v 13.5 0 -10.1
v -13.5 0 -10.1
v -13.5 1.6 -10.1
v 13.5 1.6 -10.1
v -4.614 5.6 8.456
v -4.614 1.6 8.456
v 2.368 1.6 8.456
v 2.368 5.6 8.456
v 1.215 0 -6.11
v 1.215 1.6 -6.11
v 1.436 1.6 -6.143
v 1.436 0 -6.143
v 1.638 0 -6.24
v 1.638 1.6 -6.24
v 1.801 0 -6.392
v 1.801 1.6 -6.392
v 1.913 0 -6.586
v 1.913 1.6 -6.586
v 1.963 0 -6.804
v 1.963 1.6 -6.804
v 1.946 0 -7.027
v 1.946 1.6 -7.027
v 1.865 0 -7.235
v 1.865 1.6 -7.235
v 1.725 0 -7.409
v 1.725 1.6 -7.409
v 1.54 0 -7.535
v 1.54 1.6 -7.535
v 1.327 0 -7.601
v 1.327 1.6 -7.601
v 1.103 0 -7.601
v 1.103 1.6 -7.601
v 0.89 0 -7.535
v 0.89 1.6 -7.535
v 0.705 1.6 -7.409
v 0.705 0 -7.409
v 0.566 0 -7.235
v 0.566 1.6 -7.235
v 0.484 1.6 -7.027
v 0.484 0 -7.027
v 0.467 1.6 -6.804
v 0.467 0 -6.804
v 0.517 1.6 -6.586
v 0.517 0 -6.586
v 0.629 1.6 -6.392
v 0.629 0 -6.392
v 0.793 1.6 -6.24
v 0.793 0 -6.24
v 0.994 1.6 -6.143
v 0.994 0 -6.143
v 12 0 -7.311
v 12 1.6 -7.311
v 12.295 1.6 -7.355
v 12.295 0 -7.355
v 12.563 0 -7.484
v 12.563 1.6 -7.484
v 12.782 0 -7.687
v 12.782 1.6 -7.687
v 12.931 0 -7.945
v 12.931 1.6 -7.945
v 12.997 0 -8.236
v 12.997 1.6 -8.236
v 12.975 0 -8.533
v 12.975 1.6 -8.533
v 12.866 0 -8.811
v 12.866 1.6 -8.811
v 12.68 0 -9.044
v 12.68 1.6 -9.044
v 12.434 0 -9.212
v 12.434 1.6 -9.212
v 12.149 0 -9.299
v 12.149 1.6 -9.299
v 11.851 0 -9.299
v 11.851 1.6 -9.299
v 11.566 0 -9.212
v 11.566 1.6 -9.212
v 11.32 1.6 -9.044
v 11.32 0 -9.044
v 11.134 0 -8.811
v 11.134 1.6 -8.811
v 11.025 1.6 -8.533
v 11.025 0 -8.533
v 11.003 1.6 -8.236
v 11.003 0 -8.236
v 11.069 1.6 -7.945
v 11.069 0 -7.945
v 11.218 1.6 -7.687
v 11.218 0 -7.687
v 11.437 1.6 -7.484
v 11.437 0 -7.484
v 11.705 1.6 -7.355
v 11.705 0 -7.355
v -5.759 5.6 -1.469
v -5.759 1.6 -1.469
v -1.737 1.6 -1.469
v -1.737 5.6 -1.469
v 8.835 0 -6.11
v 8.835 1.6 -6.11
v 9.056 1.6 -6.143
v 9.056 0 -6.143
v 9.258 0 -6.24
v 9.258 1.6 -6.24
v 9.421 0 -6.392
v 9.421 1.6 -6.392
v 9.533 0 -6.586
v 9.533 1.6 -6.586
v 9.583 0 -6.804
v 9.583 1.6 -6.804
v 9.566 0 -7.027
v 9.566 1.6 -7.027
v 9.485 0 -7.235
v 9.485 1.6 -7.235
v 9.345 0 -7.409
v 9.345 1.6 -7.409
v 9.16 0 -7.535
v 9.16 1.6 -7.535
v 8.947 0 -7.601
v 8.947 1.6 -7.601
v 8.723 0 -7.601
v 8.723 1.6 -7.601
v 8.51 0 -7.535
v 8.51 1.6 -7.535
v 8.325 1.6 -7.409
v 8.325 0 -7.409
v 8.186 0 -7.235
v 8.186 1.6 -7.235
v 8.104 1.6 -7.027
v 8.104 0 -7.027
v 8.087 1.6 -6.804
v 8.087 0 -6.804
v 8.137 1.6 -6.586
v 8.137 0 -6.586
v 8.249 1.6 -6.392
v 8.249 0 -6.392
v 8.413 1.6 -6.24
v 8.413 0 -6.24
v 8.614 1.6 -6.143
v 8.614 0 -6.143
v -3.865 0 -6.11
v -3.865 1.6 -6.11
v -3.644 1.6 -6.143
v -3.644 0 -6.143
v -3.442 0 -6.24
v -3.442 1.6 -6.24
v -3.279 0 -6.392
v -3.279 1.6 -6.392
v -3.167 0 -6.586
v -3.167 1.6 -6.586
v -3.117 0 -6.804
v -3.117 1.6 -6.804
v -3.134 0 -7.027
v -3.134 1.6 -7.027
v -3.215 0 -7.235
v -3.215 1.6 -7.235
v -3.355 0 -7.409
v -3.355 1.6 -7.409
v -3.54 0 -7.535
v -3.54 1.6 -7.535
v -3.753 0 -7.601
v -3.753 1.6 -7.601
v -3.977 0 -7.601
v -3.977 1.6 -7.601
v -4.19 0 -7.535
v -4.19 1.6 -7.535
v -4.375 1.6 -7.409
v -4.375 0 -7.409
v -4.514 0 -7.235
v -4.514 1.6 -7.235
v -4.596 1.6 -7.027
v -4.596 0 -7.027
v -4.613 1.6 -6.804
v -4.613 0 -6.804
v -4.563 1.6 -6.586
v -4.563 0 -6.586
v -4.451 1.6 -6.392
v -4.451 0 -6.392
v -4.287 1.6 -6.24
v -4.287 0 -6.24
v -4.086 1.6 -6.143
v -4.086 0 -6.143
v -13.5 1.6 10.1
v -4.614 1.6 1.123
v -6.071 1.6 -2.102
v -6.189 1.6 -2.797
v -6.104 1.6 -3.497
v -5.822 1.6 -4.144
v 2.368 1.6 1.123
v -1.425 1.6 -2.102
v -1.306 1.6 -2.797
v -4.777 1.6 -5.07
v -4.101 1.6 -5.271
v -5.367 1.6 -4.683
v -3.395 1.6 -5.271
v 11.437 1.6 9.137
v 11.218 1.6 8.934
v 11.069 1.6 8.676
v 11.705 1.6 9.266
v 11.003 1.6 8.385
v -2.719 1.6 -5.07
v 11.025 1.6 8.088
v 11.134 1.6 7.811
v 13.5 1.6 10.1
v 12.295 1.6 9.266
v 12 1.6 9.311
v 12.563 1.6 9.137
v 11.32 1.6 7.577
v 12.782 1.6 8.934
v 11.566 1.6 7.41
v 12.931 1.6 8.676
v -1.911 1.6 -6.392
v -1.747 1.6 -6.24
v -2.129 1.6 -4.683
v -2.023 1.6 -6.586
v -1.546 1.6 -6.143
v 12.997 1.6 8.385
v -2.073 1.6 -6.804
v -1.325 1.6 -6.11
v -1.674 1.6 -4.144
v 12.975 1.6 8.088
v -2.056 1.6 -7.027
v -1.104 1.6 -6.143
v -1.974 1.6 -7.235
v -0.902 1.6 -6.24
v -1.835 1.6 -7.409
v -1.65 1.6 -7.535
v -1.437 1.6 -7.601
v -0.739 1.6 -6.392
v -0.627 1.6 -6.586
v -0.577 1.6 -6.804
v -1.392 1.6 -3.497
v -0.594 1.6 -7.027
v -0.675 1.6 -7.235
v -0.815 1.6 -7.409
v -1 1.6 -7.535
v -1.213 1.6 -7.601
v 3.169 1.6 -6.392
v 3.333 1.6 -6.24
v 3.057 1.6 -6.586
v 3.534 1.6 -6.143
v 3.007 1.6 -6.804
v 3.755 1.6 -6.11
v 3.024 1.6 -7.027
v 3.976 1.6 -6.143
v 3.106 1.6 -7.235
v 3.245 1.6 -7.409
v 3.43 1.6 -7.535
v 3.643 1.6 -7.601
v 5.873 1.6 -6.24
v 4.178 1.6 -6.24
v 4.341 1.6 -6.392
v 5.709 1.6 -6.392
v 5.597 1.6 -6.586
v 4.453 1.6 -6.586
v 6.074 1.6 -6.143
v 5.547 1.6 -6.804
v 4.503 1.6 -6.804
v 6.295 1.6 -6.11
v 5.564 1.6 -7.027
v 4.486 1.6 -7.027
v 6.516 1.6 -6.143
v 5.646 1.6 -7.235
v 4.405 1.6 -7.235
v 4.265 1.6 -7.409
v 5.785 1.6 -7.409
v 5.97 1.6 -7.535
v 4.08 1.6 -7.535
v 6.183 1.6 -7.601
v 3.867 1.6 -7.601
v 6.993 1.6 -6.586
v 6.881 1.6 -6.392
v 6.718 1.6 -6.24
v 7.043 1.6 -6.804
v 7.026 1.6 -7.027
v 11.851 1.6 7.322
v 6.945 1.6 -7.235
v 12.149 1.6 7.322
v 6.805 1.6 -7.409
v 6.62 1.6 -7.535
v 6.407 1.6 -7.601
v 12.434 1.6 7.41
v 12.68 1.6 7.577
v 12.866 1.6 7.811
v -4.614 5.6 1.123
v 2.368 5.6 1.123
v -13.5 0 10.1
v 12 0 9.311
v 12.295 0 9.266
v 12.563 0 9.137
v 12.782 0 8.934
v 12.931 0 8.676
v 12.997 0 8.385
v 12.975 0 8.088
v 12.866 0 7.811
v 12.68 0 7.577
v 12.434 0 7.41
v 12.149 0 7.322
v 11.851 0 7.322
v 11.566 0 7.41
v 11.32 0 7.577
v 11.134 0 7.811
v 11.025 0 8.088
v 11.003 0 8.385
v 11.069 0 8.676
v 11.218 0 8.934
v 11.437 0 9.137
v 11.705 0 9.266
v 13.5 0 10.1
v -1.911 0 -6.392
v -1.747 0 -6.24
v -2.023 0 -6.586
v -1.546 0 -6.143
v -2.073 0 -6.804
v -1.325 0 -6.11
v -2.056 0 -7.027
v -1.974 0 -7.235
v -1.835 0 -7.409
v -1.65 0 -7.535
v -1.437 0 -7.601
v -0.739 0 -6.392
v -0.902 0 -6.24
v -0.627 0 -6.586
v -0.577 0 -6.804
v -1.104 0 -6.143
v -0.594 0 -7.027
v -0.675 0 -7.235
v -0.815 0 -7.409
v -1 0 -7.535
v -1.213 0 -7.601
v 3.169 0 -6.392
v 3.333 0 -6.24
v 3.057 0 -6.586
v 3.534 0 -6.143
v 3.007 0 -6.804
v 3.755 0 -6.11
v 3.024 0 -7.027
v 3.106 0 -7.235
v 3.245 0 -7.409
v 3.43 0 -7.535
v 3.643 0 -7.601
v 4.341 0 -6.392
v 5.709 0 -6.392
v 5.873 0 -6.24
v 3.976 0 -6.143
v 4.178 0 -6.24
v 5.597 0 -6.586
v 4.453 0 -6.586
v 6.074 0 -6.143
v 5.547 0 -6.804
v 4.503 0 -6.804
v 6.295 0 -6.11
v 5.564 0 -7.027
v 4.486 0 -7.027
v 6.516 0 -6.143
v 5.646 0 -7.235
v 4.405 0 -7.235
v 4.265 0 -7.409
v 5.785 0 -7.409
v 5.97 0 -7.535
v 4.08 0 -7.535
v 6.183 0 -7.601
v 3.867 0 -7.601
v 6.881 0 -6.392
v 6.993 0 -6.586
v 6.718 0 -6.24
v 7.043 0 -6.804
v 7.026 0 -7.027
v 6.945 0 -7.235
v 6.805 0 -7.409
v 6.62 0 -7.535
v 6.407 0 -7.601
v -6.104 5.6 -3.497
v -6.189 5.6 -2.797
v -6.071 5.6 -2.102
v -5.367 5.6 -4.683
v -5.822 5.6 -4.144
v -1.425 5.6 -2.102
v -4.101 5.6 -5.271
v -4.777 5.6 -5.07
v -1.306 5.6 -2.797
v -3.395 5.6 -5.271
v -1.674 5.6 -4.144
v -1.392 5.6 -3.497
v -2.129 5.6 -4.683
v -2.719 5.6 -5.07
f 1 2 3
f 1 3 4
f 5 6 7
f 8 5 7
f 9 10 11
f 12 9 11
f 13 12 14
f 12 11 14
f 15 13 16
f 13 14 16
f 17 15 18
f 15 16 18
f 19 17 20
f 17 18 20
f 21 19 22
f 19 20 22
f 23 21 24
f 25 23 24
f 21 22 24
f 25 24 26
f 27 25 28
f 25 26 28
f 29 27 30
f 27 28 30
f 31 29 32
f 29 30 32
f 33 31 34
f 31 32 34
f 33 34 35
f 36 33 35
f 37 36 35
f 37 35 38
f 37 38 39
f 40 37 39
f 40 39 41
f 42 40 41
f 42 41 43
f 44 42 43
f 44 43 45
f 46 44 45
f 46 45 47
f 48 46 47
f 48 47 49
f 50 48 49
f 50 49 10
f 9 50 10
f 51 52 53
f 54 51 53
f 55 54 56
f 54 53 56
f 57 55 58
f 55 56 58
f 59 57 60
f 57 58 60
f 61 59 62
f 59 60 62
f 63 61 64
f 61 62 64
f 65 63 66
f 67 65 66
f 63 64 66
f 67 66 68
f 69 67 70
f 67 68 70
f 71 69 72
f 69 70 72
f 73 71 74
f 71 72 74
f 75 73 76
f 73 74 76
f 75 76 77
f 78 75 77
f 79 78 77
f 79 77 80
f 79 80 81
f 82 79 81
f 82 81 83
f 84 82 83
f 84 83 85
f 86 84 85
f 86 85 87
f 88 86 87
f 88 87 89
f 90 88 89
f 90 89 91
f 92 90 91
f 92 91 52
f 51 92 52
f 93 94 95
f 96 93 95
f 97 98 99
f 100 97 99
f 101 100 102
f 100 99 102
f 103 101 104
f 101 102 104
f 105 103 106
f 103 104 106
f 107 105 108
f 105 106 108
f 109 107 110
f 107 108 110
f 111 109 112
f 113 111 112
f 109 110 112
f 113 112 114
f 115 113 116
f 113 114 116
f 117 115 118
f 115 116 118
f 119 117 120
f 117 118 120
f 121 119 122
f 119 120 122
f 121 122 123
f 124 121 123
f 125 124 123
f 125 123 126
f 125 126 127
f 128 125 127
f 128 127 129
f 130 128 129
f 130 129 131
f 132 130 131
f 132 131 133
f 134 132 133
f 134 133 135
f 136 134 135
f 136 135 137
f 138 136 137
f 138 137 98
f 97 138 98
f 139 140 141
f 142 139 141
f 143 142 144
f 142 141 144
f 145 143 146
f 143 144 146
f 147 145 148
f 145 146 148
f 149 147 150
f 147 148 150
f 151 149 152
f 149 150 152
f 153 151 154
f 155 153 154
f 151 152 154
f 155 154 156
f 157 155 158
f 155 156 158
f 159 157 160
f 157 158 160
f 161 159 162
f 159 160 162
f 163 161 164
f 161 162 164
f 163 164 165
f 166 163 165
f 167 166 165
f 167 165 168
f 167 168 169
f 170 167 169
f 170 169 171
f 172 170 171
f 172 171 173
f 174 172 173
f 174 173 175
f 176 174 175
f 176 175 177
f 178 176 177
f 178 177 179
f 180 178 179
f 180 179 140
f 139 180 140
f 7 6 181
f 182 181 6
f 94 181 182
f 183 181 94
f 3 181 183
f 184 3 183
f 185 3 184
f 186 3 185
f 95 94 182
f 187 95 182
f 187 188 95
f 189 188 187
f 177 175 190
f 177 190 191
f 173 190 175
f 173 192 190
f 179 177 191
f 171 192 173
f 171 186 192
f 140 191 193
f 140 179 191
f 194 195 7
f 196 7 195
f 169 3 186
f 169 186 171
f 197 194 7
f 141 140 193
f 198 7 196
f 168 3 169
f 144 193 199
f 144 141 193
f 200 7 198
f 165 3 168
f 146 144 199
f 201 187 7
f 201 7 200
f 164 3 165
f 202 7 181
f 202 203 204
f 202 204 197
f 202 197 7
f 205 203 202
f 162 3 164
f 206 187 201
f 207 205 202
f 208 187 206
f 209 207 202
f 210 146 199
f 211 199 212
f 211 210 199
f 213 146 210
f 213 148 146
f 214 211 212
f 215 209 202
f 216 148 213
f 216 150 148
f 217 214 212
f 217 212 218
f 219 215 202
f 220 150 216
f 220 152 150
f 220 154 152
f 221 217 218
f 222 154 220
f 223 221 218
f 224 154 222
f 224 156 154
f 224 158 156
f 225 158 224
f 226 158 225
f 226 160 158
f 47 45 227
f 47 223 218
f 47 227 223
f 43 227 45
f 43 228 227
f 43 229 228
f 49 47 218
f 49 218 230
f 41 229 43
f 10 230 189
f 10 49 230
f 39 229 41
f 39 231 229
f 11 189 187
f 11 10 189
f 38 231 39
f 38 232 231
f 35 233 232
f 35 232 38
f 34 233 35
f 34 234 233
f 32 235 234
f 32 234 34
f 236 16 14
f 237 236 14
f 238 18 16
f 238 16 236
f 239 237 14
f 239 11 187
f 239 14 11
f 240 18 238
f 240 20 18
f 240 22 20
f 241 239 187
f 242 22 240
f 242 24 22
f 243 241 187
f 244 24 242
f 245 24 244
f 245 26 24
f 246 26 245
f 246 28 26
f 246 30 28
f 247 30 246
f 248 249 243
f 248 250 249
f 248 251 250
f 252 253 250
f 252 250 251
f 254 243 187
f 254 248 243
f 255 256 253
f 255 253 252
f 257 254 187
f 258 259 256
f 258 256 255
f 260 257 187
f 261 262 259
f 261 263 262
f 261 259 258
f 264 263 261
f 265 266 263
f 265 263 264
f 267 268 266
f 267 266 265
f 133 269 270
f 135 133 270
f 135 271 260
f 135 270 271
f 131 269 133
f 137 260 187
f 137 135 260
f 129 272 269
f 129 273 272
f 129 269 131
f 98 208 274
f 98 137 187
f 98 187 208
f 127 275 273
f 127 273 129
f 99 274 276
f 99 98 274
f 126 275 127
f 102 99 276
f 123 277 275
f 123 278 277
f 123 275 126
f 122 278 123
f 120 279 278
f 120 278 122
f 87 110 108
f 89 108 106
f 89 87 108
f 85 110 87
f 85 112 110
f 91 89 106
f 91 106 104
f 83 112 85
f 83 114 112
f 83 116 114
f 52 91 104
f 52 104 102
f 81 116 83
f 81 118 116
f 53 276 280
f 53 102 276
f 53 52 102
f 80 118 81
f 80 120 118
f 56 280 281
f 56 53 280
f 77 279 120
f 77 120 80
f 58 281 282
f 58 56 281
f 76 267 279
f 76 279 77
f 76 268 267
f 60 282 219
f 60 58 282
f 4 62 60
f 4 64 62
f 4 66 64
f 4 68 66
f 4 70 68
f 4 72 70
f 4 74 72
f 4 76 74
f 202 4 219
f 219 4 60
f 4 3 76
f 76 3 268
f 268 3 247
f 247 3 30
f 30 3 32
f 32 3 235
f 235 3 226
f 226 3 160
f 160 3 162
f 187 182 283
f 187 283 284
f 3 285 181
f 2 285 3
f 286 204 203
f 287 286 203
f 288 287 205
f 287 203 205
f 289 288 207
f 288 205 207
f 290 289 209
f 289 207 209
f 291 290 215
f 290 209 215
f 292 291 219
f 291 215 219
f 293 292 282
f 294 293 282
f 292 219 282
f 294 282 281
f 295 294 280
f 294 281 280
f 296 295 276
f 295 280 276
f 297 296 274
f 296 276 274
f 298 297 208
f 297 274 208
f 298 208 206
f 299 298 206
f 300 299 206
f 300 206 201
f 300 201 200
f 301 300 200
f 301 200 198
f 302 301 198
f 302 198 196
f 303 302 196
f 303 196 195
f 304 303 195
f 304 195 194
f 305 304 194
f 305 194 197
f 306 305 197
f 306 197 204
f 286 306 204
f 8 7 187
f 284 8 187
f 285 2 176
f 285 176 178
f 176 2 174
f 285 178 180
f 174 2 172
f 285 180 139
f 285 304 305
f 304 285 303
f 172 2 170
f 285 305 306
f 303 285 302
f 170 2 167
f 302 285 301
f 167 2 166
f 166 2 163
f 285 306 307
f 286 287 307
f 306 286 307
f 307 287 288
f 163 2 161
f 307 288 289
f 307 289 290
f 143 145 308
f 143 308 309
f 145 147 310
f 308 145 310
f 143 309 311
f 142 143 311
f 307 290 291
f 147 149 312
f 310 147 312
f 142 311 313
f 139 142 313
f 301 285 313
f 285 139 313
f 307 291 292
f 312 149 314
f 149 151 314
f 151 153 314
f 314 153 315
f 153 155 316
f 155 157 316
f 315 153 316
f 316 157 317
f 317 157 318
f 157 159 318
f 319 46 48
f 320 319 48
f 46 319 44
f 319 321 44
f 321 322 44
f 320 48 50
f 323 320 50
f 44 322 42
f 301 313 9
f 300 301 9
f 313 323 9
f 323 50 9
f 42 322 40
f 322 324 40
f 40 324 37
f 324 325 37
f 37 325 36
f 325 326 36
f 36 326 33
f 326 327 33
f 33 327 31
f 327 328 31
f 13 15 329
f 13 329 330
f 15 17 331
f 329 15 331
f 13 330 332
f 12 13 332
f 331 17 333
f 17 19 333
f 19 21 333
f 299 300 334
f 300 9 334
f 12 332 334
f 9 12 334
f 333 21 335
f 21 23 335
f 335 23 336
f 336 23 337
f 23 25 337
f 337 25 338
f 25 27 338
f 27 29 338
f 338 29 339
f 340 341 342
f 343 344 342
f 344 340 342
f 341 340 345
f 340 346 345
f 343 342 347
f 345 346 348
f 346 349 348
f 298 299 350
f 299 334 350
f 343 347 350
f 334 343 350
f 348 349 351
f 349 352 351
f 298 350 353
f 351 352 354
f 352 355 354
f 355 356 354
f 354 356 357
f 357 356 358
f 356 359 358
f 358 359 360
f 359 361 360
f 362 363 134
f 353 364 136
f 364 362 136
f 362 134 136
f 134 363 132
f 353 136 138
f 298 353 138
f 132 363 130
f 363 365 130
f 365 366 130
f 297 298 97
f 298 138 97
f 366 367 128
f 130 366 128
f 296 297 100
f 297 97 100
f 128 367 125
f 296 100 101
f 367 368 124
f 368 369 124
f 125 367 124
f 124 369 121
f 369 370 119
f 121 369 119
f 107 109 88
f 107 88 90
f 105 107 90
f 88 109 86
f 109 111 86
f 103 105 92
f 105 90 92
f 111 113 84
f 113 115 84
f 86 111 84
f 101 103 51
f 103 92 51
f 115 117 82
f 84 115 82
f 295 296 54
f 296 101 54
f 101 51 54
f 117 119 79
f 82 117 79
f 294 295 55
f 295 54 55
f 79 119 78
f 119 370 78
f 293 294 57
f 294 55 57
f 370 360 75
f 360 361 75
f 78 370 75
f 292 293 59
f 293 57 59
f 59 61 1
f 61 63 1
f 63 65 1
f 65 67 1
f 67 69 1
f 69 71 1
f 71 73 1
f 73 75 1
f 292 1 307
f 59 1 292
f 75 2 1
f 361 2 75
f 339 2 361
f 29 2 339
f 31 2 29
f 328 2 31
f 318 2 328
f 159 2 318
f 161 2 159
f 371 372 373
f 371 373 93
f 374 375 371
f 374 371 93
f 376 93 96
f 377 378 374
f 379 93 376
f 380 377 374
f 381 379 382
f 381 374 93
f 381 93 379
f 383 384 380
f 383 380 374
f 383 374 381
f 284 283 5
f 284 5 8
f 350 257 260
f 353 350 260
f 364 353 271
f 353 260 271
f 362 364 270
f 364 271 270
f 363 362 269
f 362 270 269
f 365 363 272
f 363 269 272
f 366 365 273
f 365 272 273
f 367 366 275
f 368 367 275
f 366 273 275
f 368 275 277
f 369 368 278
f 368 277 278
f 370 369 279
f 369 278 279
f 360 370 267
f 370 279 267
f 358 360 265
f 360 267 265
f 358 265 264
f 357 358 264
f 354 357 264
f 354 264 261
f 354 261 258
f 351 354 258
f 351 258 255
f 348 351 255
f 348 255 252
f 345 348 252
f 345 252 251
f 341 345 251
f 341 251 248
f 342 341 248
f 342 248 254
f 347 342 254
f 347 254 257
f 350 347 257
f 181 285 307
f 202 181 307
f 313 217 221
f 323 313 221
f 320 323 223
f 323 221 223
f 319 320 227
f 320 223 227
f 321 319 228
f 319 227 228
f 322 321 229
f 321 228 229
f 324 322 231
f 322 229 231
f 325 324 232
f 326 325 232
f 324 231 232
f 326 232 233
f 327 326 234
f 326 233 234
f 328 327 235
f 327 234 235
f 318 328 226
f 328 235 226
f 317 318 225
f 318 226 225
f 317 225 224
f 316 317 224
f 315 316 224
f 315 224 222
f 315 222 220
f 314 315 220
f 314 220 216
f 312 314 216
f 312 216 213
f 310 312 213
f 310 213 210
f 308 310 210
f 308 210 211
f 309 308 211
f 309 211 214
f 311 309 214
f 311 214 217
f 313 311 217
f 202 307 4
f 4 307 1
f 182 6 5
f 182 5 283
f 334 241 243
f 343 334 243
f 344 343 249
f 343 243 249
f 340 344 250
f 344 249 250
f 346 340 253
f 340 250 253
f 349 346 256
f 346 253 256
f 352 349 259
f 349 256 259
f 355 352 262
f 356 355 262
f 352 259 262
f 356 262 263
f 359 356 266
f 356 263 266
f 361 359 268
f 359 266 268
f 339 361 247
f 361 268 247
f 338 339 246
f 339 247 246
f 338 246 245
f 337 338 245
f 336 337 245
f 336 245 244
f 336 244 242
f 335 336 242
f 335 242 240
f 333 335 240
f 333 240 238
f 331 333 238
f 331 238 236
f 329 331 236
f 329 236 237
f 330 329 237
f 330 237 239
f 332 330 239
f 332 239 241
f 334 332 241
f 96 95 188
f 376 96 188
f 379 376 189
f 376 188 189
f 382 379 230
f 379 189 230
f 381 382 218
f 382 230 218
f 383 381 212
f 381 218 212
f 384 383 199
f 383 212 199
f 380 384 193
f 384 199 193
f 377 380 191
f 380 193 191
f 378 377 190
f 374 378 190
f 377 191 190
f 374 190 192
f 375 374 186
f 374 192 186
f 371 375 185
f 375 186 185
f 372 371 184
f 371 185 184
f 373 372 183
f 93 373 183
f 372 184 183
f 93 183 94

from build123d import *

# Parameters (mm, degrees)
SKETCH1_W           = 27
SKETCH1_H           = 20.2
BOSS_EXTRUDE1_DEPTH = 1.6
SKETCH2_R           = 1
CUT_EXTRUDE1_DEPTH  = 17.935760981
SKETCH4_R           = 0.75
CUT_EXTRUDE2_DEPTH  = 17.935760981
SKETCH6_W           = 6.981427811
SKETCH6_H           = 7.333205182
BOSS_EXTRUDE2_DEPTH = 4
BOSS_EXTRUDE3_DEPTH = 4


with BuildPart() as part:
    # Sketch1 → Boss-Extrude1 (new body)
    with BuildSketch(Plane(origin=(0, 0, 0), x_dir=(1, 0, 0), z_dir=(0, 1, 0))):
        Rectangle(SKETCH1_W, SKETCH1_H)
    extrude(amount=BOSS_EXTRUDE1_DEPTH)

    # Sketch2 → Cut-Extrude1 (cut, through all)
    with BuildSketch(Plane(origin=(0, 1.6, 0), x_dir=(1, 0, 0), z_dir=(0, 1, 0))):
        with Locations(Location((12, 8.310541443, 0), (0, 0, 270))):
            Circle(SKETCH2_R)
        with Locations(Location((12, -8.310541443, 0), (0, 0, 270))):
            Circle(SKETCH2_R)
    extrude(amount=-CUT_EXTRUDE1_DEPTH, mode=Mode.SUBTRACT)

    # Sketch4 → Cut-Extrude2 (cut, through all)
    with BuildSketch(Plane(origin=(0, 1.6, 0), x_dir=(1, 0, 0), z_dir=(0, 1, 0))):
        with Locations(Location((8.835023955, 6.859658721, 0), (0, 0, 270))):
            Circle(SKETCH4_R)
        with Locations(Location((6.295023955, 6.859658721, 0), (0, 0, 270))):
            Circle(SKETCH4_R)
        with Locations(Location((3.755023955, 6.859658721, 0), (0, 0, 270))):
            Circle(SKETCH4_R)
        with Locations(Location((1.215023955, 6.859658721, 0), (0, 0, 270))):
            Circle(SKETCH4_R)
        with Locations(Location((-1.324976045, 6.859658721, 0), (0, 0, 270))):
            Circle(SKETCH4_R)
        with Locations(Location((-3.864976045, 6.859658721, 0), (0, 0, 270))):
            Circle(SKETCH4_R)
    extrude(amount=-CUT_EXTRUDE2_DEPTH, mode=Mode.SUBTRACT)

    # Sketch6 → Boss-Extrude2 (add)
    with BuildSketch(Plane(origin=(0, 1.6, 0), x_dir=(1, 0, 0), z_dir=(0, 1, 0))):
        with Locations((-1.122981606, -4.789584196)):
            Rectangle(SKETCH6_W, SKETCH6_H)
    extrude(amount=BOSS_EXTRUDE2_DEPTH)

    # Sketch7 → Boss-Extrude3 (add)
    with BuildSketch(Plane(origin=(0, 1.6, 0), x_dir=(1, 0, 0), z_dir=(0, 1, 0))):
        with BuildLine():
            Line((-5.758618523, 1.468961855), (-1.736945444, 1.468961855))
            ThreePointArc((-1.736945444, 1.468961855), (-3.747781984, 5.296946033), (-5.758618523, 1.468961855))
        make_face()
    extrude(amount=BOSS_EXTRUDE3_DEPTH)


solid = part.part
